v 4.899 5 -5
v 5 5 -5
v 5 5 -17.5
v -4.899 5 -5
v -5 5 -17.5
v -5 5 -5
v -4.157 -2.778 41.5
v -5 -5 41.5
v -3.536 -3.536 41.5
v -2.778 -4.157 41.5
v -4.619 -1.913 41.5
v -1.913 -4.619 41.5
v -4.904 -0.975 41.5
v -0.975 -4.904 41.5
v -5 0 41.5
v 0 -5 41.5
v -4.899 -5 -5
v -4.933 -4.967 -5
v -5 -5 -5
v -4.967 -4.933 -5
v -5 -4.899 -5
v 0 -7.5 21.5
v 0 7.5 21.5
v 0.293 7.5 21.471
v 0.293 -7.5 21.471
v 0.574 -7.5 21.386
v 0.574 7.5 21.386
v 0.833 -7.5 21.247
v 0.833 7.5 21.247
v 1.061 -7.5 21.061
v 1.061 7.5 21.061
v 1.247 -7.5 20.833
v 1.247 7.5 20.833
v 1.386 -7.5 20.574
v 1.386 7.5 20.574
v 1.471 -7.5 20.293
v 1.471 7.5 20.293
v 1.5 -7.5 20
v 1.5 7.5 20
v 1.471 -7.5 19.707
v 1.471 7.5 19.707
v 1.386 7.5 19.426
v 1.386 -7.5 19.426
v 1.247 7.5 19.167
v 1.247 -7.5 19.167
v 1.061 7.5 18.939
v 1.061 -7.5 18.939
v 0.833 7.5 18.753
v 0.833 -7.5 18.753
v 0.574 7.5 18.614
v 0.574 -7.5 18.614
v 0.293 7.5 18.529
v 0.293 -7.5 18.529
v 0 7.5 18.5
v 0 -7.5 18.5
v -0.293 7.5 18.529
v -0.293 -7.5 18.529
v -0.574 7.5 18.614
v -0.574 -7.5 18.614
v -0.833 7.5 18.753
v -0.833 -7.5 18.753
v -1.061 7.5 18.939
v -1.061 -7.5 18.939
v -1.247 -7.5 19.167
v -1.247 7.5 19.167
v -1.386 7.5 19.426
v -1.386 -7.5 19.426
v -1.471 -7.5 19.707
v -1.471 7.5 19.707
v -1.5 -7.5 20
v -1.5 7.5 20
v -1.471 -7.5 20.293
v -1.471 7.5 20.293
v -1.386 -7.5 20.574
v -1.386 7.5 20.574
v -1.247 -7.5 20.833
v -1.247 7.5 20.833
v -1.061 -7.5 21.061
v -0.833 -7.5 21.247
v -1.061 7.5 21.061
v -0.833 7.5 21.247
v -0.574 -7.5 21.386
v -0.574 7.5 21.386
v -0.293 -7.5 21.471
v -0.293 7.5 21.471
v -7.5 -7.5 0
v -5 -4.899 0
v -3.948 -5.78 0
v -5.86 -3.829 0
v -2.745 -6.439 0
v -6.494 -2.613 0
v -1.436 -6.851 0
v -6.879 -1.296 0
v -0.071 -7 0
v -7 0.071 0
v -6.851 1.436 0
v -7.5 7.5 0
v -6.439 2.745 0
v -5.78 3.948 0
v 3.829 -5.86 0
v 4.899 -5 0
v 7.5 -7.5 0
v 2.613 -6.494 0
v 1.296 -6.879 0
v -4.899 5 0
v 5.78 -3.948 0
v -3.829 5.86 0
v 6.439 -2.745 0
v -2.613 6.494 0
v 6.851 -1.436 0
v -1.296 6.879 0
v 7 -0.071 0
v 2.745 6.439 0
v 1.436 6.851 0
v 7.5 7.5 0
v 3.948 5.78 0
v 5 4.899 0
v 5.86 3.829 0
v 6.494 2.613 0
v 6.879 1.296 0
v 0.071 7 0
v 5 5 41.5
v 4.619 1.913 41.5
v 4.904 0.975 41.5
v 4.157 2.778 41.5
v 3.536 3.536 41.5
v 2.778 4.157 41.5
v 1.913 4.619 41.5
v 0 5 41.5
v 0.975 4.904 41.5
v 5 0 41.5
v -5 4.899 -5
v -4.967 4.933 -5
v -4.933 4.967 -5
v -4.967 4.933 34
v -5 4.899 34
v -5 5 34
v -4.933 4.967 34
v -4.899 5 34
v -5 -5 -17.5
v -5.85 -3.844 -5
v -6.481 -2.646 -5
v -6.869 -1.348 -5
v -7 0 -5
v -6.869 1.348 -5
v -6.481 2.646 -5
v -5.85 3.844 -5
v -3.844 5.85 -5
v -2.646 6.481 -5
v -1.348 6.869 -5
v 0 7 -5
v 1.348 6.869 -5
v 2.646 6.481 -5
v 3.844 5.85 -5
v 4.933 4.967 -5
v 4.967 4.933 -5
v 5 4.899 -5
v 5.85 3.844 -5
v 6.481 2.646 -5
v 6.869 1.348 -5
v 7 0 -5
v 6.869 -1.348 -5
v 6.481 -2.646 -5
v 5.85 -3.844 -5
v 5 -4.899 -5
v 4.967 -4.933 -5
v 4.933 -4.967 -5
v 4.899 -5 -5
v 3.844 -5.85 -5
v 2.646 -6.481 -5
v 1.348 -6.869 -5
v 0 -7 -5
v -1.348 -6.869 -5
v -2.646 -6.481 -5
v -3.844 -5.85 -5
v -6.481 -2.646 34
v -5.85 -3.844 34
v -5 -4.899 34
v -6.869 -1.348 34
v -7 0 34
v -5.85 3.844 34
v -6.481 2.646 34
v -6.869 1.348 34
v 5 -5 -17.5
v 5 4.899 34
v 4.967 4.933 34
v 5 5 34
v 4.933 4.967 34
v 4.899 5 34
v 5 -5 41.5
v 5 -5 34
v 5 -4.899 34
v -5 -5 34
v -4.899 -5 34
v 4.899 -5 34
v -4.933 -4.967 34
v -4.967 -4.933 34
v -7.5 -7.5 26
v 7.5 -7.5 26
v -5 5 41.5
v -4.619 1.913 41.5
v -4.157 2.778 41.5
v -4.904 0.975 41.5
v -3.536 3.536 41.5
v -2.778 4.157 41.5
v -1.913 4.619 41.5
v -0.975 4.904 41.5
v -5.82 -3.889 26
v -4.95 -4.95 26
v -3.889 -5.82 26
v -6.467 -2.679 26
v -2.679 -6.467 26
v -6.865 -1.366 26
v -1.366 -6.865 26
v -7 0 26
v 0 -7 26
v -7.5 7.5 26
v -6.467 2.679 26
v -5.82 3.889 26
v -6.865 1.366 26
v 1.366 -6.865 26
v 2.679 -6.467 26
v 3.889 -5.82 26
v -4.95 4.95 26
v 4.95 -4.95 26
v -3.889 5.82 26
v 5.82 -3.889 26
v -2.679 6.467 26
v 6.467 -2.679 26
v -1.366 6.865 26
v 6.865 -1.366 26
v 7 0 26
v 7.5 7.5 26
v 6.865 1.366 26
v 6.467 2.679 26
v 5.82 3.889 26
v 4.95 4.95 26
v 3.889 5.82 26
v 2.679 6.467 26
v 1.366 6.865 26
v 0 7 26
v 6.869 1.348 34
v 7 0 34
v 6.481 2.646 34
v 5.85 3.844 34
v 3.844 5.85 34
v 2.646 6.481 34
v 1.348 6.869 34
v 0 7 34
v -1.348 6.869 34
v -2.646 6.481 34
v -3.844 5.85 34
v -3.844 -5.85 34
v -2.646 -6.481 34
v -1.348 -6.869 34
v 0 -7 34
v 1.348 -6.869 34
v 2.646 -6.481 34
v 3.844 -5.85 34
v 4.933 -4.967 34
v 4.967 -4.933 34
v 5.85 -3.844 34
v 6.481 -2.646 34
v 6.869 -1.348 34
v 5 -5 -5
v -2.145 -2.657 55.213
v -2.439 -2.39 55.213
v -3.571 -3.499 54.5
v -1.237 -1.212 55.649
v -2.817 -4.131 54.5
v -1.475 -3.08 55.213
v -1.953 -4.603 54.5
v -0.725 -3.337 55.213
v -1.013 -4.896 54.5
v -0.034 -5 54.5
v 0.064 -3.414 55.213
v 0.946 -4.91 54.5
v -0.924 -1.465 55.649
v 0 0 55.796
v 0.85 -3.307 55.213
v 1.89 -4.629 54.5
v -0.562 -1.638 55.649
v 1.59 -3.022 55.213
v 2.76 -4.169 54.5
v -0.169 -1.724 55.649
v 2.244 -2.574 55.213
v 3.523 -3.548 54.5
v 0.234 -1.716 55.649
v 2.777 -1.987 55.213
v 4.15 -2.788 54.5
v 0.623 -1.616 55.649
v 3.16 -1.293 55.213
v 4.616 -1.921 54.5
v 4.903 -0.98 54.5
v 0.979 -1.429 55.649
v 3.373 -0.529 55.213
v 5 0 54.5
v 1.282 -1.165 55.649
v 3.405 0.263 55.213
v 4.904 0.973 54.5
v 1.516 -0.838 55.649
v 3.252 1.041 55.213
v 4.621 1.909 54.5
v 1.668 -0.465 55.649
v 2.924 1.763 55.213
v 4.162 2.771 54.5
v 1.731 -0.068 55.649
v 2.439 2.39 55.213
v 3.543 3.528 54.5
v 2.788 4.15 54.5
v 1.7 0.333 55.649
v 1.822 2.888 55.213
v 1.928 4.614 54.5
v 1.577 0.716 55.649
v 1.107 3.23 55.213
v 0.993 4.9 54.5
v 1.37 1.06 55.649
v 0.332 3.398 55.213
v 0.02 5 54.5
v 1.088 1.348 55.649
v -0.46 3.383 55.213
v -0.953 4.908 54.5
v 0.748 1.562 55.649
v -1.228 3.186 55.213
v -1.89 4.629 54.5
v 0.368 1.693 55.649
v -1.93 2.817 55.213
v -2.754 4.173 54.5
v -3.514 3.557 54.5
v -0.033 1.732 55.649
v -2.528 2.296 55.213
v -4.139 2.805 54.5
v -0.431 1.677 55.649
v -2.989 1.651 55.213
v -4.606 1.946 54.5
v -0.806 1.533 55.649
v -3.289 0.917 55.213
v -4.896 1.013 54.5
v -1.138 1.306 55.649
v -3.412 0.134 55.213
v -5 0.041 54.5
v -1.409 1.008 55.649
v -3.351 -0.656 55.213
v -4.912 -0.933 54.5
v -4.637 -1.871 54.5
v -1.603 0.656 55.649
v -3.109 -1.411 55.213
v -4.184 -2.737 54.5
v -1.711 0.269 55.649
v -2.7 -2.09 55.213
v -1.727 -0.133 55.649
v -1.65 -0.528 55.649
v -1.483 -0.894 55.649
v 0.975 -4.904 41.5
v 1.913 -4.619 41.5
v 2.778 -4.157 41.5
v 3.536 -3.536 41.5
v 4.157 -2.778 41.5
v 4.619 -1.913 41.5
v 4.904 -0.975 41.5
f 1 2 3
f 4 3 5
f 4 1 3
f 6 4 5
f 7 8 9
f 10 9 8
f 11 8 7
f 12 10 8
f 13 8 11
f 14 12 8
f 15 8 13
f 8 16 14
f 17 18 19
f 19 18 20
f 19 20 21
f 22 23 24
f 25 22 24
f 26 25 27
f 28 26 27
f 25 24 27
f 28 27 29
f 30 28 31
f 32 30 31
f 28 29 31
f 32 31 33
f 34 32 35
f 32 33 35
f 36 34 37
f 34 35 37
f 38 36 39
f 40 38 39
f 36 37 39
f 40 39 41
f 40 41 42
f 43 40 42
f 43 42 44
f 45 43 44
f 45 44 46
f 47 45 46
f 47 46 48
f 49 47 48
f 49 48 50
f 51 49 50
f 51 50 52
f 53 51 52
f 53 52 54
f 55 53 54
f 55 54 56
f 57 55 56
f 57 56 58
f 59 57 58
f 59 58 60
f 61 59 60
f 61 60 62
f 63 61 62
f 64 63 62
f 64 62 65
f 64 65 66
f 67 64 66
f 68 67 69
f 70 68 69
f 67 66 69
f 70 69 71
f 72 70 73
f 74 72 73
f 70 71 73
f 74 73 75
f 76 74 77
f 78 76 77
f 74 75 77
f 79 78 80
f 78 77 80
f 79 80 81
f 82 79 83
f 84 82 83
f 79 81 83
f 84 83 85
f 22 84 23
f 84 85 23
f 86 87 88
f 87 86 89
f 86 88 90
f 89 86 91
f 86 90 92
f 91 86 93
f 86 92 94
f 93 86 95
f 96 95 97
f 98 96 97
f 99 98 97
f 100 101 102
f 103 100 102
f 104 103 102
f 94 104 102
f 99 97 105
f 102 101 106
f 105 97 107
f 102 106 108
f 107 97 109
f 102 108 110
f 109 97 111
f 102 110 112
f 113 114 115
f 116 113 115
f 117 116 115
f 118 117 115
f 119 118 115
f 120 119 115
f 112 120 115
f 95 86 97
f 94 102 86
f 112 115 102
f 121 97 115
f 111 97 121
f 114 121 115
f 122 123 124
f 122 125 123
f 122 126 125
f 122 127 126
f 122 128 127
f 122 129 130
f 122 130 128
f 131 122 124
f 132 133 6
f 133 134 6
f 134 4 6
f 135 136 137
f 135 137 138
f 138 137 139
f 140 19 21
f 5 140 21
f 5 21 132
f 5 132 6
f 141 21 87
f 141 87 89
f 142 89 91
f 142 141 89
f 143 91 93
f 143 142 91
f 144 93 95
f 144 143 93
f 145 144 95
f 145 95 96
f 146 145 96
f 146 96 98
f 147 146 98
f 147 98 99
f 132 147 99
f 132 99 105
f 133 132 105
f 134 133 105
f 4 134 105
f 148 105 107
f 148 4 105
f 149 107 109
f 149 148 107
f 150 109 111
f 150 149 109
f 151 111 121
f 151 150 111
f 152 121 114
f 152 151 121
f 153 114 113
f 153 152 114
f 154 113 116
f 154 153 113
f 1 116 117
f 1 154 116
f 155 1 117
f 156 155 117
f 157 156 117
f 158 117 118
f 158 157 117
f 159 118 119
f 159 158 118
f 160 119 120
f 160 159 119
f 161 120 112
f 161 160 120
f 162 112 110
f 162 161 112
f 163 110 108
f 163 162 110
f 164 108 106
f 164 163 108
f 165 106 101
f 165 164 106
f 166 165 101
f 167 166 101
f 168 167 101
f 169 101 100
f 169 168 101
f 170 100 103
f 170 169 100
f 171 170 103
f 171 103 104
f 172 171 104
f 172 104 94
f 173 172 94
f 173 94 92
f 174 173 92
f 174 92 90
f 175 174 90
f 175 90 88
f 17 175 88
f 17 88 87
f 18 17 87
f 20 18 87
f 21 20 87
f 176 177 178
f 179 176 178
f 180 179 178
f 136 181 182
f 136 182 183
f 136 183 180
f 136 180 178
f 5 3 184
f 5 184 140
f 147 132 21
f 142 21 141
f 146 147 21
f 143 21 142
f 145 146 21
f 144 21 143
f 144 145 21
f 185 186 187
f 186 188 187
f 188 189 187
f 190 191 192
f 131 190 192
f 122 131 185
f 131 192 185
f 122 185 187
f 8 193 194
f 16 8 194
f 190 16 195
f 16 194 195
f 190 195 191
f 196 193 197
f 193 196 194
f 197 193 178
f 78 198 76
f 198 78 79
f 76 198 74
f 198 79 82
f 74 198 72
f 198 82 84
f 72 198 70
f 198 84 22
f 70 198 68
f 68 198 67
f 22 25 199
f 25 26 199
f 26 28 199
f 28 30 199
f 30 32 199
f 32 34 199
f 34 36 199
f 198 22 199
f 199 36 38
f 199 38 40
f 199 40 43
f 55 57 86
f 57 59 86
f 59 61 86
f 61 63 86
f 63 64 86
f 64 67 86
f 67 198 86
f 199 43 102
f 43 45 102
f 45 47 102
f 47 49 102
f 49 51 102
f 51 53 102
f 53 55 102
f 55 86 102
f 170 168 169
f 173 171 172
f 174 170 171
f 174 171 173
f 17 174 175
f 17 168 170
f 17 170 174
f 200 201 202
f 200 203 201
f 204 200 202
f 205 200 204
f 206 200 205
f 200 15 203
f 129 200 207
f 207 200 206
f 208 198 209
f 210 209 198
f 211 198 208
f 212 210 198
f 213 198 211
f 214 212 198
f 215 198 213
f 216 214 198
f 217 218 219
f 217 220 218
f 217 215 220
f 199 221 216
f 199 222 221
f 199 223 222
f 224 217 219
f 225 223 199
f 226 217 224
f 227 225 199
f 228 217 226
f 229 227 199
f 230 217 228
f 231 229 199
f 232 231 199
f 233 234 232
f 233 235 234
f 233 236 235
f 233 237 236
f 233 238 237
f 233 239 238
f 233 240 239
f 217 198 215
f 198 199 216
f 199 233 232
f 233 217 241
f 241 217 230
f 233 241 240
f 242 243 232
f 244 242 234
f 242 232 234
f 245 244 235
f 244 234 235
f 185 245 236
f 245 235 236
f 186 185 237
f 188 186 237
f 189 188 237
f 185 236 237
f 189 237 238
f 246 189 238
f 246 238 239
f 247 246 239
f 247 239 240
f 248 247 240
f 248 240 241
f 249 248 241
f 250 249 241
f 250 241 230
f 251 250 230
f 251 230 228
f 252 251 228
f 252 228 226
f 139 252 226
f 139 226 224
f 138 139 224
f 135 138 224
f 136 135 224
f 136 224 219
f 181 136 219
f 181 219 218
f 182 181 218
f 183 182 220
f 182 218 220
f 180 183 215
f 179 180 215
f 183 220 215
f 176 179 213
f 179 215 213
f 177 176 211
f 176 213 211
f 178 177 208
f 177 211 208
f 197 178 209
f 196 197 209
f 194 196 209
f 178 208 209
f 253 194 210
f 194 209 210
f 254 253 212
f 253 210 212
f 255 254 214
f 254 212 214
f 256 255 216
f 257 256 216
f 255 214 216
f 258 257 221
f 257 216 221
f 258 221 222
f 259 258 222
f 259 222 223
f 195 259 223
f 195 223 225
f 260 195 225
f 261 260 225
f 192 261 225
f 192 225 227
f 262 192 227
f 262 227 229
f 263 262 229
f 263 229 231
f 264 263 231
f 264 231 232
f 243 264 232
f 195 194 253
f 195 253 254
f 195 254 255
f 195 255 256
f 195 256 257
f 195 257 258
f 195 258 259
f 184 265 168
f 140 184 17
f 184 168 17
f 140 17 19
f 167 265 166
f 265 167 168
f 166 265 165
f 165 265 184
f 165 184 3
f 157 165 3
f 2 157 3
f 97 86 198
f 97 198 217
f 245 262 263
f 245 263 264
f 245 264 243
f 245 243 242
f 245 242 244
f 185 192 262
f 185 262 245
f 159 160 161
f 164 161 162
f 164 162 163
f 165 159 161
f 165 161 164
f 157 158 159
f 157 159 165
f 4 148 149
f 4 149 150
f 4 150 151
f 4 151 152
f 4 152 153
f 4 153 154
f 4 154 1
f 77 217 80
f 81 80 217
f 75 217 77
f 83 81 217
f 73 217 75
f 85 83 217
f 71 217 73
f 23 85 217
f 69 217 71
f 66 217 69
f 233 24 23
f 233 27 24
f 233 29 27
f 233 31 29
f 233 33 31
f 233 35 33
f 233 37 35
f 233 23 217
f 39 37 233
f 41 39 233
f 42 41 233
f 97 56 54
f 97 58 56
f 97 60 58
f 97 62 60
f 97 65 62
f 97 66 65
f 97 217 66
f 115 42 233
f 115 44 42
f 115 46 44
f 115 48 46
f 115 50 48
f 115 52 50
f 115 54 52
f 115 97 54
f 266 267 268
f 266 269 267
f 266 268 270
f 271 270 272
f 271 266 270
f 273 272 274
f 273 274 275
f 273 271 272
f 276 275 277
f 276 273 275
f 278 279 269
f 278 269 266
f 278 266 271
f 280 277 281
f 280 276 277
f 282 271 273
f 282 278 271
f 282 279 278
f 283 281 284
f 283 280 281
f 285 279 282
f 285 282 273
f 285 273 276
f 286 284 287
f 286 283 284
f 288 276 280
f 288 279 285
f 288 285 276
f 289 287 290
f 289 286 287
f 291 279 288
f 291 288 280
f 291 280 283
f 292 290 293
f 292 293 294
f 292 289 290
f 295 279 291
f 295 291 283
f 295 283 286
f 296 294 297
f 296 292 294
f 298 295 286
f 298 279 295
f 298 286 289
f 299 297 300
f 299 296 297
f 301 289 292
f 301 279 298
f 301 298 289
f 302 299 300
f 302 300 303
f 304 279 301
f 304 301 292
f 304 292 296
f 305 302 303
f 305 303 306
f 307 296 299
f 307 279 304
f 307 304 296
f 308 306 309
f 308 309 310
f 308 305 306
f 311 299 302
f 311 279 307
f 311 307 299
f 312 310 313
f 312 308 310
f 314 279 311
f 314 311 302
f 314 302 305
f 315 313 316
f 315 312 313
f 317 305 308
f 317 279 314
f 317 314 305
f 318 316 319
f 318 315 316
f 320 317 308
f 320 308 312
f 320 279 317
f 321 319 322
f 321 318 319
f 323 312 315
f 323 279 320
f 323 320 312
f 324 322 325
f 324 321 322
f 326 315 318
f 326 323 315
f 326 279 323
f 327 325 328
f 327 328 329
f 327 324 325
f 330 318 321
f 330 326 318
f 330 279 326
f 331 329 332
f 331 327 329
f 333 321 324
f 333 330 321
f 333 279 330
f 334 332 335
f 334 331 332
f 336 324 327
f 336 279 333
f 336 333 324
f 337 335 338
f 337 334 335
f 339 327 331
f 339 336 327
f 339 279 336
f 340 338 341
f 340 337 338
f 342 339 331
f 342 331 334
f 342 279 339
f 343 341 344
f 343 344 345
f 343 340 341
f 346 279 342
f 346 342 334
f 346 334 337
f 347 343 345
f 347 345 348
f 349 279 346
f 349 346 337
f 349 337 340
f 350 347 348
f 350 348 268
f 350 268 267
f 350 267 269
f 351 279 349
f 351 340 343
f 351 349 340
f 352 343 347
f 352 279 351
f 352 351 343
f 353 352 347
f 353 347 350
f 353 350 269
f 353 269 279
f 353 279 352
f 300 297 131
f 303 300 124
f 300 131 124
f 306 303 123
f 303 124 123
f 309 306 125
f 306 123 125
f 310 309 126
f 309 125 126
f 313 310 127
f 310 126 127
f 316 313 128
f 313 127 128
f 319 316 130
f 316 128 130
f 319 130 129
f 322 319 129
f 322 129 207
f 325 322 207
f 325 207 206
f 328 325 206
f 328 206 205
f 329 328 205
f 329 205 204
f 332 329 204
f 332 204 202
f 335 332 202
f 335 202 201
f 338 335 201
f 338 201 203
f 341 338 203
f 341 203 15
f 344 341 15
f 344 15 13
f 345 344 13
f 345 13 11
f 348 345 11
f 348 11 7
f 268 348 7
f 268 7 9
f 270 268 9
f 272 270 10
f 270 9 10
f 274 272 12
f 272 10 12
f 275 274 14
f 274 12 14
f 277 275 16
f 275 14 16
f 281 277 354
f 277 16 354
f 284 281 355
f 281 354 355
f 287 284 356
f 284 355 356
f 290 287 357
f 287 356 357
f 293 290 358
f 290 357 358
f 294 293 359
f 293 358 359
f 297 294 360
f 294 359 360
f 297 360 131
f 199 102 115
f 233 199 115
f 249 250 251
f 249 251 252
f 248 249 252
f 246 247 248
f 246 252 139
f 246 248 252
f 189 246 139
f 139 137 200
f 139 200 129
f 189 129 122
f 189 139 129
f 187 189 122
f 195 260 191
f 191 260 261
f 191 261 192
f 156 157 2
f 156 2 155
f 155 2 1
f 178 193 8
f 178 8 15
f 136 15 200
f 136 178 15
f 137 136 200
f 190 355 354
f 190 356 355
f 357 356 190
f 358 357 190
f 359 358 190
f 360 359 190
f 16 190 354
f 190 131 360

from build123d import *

# Parameters (mm, degrees)
SKETCH1_W           = 15
SKETCH1_H           = 15
BOSS_EXTRUDE1_DEPTH = 26
SKETCH2_R           = 1.5
CUT_EXTRUDE1_DEPTH  = 31.939457009
SKETCH3_R           = 7
BOSS_EXTRUDE2_DEPTH = 8
SKETCH4_W           = 10
SKETCH4_H           = 10
BOSS_EXTRUDE3_DEPTH = 7.5
SKETCH5_R           = 5
BOSS_EXTRUDE4_DEPTH = 13
BOSS_EXTRUDE5_START = 5
SKETCH7_R           = 7
BOSS_EXTRUDE5_DEPTH = 5
SKETCH8_W           = 10
SKETCH8_H           = 10
BOSS_EXTRUDE6_DEPTH = 12.5


with BuildPart() as part:
    # Sketch1 → Boss-Extrude1 (new body)
    with BuildSketch(Plane.XY):
        Rectangle(SKETCH1_W, SKETCH1_H)
    extrude(amount=BOSS_EXTRUDE1_DEPTH)

    # Sketch2 → Cut-Extrude1 (cut, through all)
    with BuildSketch(Plane(origin=(0, 7.5, 0), x_dir=(1, 0, 0), z_dir=(0, 1, 0))):
        with Locations(Location((0, -20, 0), (0, 0, 270))):
            Circle(SKETCH2_R)
    extrude(amount=-CUT_EXTRUDE1_DEPTH, mode=Mode.SUBTRACT)

    # Sketch3 → Boss-Extrude2 (add)
    with BuildSketch(Plane.XY.offset(26)):
        Circle(SKETCH3_R)
    extrude(amount=BOSS_EXTRUDE2_DEPTH)

    # Sketch4 → Boss-Extrude3 (add)
    with BuildSketch(Plane.XY.offset(34)):
        Rectangle(SKETCH4_W, SKETCH4_H)
    extrude(amount=BOSS_EXTRUDE3_DEPTH)

    # Sketch5 → Boss-Extrude4 (add)
    with BuildSketch(Plane.XY.offset(41.5)):
        Circle(SKETCH5_R)
    extrude(amount=BOSS_EXTRUDE4_DEPTH)

    # Sketch6 → Revolve1 (revolve)
    with BuildSketch(Plane(origin=(0, 0, 0), x_dir=(1, 0, 0), z_dir=(0, 1, 0)), mode=Mode.PRIVATE) as revolve1_sk:
        with BuildLine():
            Line((0, -54.5), (5, -54.5))
            ThreePointArc((5, -54.5), (2.582569334, -55.466460537), (0, -55.795630141))
            Line((0, -55.795630141), (0, -54.5))
        make_face()
    revolve(revolve1_sk.sketch.rotate(Axis((0, 0, 54.5), (0, 0, 1)), 224.415308597), axis=Axis((0, 0, 54.5), (0, 0, 1)))

    # Sketch7 → Boss-Extrude5 (add)
    with BuildSketch(Plane(origin=(0, 0, 0), x_dir=(-1, 0, 0), z_dir=(0, 0, -1)).offset(BOSS_EXTRUDE5_START)):
        with Locations(Location((0, 0, 0), (0, 0, 315.584691403))):
            Circle(SKETCH7_R)
    extrude(amount=-BOSS_EXTRUDE5_DEPTH)

    # Sketch8 → Boss-Extrude6 (add)
    with BuildSketch(Plane(origin=(0, 0, -5), x_dir=(-1, 0, 0), z_dir=(0, 0, -1))):
        Rectangle(SKETCH8_W, SKETCH8_H)
    extrude(amount=BOSS_EXTRUDE6_DEPTH)


solid = part.part
